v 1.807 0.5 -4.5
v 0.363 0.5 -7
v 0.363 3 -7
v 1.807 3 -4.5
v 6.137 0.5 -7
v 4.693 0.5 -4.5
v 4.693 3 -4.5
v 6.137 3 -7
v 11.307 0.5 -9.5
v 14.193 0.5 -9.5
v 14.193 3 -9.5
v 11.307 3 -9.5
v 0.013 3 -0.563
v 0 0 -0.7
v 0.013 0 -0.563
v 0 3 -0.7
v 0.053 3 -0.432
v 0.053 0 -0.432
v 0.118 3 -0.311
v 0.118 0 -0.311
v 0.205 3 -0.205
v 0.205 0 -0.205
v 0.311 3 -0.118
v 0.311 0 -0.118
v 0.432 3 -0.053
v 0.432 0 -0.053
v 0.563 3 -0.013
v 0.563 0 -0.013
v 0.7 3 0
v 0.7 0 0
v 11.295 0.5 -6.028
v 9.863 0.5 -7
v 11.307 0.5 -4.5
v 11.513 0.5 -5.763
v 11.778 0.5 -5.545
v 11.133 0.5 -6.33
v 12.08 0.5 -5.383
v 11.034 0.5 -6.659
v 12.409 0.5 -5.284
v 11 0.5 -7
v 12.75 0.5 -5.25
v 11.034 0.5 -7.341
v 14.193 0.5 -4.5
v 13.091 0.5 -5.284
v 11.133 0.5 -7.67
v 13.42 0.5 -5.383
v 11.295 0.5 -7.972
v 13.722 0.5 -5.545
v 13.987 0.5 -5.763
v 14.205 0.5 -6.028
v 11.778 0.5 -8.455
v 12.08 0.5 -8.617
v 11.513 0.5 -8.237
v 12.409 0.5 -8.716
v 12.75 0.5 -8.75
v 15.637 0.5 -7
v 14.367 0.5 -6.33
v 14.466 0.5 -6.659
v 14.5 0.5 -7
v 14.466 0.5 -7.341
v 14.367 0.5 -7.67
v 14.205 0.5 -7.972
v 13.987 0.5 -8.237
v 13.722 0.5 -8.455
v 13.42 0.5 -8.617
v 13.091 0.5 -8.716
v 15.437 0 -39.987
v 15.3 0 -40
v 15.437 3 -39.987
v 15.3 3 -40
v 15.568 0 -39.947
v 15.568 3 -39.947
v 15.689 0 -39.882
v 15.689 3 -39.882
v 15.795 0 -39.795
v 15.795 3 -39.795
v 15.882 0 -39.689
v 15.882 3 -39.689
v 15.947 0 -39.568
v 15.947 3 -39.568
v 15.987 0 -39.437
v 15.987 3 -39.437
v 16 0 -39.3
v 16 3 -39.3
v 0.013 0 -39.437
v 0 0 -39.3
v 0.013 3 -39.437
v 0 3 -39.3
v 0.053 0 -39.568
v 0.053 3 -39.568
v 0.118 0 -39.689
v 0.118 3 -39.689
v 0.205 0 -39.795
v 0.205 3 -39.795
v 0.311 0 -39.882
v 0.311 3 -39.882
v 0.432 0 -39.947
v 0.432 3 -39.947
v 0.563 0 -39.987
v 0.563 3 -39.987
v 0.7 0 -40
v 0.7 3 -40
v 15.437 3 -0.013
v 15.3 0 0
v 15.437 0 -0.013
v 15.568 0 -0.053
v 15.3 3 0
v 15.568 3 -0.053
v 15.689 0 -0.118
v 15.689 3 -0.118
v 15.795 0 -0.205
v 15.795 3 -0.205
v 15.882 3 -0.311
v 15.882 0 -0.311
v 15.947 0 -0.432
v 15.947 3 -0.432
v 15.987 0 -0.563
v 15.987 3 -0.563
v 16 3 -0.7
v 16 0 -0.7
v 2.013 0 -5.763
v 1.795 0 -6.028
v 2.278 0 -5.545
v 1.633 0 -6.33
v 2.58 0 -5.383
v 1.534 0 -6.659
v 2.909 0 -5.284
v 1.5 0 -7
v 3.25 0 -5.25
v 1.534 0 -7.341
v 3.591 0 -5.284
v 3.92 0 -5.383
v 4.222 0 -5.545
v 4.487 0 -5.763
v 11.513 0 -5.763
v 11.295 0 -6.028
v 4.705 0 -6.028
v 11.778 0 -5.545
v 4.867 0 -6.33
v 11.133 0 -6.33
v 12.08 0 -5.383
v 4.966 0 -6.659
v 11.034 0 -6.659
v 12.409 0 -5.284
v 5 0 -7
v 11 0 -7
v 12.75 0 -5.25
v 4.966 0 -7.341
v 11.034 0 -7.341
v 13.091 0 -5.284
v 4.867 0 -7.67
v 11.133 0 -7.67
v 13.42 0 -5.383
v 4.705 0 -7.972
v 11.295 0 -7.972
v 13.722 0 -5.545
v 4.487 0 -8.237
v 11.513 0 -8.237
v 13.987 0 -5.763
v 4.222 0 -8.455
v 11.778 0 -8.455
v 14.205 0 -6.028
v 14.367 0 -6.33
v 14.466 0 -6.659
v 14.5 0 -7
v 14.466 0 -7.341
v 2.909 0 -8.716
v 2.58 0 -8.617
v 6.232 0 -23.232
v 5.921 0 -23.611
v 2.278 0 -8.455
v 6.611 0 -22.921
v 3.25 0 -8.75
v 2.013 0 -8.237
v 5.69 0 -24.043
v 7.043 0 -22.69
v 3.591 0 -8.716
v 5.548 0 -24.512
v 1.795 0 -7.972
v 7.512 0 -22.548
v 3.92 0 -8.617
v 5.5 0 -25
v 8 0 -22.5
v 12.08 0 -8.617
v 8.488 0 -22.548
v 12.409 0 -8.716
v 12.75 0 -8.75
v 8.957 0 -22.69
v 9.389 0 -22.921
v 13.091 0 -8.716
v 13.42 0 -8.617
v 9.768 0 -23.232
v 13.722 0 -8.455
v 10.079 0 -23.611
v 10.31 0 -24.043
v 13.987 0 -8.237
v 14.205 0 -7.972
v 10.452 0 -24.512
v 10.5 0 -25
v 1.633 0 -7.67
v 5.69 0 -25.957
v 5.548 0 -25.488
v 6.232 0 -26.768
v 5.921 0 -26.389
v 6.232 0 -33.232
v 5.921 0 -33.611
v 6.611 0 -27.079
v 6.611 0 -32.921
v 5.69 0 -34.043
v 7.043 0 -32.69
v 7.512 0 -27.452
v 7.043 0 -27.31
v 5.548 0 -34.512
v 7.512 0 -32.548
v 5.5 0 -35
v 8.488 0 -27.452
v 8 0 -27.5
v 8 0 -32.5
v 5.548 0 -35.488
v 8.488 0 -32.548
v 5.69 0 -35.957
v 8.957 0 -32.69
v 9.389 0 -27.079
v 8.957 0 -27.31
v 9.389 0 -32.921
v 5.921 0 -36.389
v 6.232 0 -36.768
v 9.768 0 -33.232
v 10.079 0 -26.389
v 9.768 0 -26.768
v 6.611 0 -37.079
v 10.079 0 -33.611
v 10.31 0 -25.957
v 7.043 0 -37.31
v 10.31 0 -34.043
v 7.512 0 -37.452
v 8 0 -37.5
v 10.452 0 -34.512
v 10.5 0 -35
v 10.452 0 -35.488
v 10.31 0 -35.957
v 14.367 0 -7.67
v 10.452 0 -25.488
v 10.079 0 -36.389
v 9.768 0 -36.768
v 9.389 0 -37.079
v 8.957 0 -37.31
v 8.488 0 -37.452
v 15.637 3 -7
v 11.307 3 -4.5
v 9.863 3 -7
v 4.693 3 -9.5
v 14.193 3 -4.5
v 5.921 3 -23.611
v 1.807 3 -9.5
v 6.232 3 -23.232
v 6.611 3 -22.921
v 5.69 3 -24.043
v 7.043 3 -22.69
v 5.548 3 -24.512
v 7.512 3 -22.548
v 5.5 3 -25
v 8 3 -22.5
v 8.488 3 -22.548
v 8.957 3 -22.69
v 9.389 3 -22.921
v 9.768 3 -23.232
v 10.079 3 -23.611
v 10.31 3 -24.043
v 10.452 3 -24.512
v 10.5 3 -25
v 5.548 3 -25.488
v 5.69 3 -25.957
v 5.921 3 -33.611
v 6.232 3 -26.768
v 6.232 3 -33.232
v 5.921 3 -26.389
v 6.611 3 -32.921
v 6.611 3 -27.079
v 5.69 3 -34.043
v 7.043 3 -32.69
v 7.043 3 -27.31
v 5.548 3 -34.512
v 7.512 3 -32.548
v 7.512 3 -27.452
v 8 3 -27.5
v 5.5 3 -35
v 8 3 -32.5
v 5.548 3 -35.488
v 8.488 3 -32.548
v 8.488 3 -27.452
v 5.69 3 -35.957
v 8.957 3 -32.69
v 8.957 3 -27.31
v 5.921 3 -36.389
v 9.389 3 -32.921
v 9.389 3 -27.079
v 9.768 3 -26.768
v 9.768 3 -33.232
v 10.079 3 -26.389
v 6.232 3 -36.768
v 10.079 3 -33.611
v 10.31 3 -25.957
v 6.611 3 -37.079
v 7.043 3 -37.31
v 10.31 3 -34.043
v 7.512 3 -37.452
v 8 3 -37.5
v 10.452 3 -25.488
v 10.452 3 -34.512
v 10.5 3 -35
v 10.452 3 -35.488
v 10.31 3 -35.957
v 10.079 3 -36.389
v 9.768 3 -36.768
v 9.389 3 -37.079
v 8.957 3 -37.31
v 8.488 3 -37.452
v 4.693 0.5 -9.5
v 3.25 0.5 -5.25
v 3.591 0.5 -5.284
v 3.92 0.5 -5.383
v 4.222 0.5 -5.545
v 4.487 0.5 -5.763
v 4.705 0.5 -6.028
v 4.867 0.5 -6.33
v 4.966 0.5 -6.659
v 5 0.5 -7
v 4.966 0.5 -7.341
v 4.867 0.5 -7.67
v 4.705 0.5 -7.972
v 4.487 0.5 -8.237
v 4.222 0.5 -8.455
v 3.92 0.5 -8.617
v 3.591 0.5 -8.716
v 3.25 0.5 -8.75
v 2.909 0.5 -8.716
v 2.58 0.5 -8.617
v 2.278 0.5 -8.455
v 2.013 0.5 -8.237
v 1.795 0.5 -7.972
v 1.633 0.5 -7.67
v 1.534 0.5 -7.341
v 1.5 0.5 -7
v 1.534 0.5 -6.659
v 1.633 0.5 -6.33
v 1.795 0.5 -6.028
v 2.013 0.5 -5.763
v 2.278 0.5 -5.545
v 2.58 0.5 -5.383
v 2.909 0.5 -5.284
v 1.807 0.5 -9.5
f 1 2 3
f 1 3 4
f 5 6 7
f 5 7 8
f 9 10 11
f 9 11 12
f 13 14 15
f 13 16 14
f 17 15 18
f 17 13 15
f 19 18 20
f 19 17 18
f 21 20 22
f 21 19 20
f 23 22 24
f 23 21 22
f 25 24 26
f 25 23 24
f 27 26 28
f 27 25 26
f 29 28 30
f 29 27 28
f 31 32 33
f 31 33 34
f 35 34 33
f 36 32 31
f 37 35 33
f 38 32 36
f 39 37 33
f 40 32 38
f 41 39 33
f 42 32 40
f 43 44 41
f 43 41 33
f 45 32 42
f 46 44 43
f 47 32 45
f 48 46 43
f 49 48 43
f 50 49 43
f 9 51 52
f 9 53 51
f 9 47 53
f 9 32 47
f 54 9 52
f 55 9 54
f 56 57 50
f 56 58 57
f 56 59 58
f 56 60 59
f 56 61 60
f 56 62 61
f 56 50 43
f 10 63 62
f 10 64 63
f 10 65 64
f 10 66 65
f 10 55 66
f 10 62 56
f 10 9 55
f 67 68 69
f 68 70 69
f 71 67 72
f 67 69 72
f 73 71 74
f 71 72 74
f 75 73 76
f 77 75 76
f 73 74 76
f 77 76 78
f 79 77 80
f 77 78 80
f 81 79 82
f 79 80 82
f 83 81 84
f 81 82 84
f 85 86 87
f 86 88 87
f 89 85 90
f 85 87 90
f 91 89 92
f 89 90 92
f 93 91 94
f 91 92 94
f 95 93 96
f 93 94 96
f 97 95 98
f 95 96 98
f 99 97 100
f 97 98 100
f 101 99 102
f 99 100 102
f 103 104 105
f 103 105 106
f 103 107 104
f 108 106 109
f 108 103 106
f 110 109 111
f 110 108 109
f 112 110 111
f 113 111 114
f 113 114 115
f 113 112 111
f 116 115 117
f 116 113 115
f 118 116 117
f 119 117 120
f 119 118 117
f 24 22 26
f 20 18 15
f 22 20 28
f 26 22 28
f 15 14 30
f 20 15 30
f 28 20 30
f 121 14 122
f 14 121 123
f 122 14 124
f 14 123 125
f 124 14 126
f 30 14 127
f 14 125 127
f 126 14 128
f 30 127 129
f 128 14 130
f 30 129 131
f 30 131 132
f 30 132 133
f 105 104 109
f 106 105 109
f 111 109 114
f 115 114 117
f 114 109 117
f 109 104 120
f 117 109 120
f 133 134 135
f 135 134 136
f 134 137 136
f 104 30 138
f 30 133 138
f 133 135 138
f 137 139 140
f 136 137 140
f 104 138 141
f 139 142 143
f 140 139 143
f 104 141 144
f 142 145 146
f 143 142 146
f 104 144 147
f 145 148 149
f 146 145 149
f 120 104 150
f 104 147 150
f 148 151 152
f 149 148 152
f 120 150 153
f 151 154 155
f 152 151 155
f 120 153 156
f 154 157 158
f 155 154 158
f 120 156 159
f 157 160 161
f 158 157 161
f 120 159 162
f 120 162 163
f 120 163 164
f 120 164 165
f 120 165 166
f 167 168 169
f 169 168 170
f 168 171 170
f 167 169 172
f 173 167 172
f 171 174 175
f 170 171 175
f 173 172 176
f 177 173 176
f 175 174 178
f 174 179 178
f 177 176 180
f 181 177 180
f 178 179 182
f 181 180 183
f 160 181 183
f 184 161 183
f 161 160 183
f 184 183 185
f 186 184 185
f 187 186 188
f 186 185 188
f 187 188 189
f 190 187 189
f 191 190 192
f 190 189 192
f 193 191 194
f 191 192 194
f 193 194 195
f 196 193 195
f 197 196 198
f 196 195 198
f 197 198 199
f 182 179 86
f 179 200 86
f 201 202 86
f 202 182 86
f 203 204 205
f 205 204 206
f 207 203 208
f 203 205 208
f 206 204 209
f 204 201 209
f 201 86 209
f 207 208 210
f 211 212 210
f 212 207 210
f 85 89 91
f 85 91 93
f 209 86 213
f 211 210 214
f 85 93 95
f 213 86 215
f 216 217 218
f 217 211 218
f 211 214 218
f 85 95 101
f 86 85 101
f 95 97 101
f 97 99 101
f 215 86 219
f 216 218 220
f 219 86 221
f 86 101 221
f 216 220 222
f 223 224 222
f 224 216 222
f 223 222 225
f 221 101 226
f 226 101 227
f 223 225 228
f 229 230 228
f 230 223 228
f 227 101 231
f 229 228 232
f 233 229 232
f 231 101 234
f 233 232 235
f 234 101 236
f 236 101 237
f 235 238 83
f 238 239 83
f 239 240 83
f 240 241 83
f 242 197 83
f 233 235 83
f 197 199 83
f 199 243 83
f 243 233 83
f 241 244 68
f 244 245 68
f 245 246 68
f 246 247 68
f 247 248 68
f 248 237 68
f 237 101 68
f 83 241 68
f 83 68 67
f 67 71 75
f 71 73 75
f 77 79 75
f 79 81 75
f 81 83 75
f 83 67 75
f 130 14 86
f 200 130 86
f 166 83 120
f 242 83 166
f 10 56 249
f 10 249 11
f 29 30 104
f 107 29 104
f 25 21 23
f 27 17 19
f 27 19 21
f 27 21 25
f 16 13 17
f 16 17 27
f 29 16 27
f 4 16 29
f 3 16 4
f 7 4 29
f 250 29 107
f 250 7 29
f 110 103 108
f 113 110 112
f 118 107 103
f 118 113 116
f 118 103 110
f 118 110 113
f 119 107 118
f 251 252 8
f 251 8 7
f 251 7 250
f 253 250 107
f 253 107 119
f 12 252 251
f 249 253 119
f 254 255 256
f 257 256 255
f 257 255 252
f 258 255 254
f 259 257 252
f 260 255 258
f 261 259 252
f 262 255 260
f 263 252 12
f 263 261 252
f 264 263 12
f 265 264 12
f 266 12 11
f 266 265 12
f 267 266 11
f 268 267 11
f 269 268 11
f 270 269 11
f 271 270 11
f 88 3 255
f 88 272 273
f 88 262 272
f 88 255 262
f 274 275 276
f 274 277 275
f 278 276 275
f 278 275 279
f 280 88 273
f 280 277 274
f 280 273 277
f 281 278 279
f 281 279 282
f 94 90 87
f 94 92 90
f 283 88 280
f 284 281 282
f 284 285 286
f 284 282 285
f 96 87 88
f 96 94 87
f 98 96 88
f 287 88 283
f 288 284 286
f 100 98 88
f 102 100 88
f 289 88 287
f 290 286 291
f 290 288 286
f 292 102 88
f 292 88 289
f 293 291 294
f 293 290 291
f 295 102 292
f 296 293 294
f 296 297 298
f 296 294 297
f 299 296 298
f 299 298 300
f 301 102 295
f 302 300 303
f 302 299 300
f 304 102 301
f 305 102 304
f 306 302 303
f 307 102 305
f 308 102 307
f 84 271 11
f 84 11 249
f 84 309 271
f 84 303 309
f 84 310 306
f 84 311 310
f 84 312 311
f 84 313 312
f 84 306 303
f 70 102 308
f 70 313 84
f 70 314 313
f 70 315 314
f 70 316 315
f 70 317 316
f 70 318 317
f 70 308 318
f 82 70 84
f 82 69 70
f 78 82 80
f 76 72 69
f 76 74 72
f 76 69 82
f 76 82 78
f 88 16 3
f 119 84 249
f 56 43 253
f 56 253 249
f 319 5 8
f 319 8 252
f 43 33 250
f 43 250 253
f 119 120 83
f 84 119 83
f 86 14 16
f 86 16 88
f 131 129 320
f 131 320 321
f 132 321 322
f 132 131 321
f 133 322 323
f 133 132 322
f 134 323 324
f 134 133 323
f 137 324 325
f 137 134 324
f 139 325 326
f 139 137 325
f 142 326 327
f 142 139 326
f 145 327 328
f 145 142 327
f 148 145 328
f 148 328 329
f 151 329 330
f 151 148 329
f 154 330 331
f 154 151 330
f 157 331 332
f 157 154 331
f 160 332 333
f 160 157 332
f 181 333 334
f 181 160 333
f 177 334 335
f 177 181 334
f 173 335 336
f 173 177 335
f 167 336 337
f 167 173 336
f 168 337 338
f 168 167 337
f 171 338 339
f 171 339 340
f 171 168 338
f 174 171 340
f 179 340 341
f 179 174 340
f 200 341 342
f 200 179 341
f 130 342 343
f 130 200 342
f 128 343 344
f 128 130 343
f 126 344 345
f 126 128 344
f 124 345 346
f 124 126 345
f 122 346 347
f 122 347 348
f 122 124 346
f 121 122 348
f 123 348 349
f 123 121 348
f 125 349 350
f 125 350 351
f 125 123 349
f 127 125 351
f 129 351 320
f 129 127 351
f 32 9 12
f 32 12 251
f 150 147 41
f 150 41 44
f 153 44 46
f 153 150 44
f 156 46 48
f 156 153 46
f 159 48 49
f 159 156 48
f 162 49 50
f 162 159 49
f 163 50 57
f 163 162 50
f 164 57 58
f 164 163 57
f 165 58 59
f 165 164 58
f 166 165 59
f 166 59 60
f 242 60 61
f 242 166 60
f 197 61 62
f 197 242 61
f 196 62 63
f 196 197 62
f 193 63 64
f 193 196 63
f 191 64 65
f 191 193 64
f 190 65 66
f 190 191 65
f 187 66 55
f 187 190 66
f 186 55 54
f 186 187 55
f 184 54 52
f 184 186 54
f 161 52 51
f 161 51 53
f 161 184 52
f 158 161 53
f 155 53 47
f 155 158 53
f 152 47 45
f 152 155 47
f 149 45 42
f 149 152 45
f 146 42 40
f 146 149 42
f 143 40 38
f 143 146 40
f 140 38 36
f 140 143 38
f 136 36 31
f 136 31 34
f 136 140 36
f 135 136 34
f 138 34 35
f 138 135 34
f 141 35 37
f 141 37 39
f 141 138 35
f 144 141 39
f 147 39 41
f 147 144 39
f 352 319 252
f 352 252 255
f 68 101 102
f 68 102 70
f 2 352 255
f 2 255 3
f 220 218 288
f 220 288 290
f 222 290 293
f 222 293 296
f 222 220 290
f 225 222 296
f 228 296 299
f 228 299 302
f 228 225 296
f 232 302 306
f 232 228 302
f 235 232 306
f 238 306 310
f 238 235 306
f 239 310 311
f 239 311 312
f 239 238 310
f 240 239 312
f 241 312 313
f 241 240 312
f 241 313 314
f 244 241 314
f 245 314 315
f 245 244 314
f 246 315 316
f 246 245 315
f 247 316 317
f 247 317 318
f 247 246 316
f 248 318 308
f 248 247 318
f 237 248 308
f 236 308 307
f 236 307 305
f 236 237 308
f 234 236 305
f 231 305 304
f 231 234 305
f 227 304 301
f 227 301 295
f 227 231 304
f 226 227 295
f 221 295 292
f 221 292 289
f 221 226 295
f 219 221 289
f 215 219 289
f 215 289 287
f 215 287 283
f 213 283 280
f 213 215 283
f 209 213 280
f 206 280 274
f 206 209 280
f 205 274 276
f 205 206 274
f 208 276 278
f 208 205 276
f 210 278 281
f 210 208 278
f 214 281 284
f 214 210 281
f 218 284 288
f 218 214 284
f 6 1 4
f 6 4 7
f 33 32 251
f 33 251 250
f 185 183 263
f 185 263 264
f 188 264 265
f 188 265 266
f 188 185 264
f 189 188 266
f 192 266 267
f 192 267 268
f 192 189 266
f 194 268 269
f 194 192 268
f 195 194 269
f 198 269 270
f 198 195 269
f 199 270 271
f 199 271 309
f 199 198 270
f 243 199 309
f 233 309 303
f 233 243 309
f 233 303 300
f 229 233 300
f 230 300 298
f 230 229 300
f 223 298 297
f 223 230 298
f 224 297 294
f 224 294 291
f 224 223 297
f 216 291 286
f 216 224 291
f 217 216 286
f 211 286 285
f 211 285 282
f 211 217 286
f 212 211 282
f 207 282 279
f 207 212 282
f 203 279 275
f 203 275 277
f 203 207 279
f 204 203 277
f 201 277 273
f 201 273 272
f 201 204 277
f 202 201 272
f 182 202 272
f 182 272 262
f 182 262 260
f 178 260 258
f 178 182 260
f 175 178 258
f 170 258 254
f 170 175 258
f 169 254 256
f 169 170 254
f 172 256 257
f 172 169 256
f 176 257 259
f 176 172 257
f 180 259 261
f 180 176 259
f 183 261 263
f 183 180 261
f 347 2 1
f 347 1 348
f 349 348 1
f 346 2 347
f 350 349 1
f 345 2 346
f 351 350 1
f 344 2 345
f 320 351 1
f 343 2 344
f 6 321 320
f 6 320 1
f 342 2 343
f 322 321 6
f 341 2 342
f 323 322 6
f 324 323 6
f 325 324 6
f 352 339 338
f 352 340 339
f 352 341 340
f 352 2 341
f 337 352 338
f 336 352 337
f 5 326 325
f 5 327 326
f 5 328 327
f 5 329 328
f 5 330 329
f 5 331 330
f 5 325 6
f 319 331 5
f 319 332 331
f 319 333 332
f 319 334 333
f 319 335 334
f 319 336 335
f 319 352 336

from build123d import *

# Parameters (mm, degrees)
SKETCH1_W           = 16
SKETCH1_H           = 40
SKETCH1_R           = 2.5
BOSS_EXTRUDE1_DEPTH = 3
SKETCH1_3_R         = 1.75
BOSS_EXTRUDE2_DEPTH = 0.5
FILLET1_R           = 0.7


with BuildPart() as part:
    # Sketch1 → Boss-Extrude1 (new body)
    with BuildSketch(Plane(origin=(0, 0, 0), x_dir=(1, 0, 0), z_dir=(0, 1, 0))):
        with Locations((8, 20)):
            Rectangle(SKETCH1_W, SKETCH1_H)
        Polygon((1.806624327, 9.5), (4.693375673, 9.5), (6.136751346, 7), (4.693375673, 4.5), (1.806624327, 4.5), (0.363248654, 7), align=None, mode=Mode.SUBTRACT)
        Polygon((9.863248654, 7), (11.306624327, 9.5), (14.193375673, 9.5), (15.636751346, 7), (14.193375673, 4.5), (11.306624327, 4.5), align=None, mode=Mode.SUBTRACT)
        with Locations((8, 25)):
            Circle(SKETCH1_R, mode=Mode.SUBTRACT)
        with Locations((8, 35)):
            Circle(SKETCH1_R, mode=Mode.SUBTRACT)
    extrude(amount=BOSS_EXTRUDE1_DEPTH)

    # Sketch1<3> → Boss-Extrude2 (add)
    # profile 1 of 2: a face of its own
    with BuildSketch(Plane(origin=(0, 0, 0), x_dir=(1, 0, 0), z_dir=(0, 1, 0))):
        Polygon((6.136751346, 7), (4.693375673, 9.5), (1.806624327, 9.5), (0.363248654, 7), (1.806624327, 4.5), (4.693375673, 4.5), align=None)
        with Locations((3.25, 7)):
            Circle(SKETCH1_3_R, mode=Mode.SUBTRACT)
    # profile 2 of 2: a face of its own
    with BuildSketch(Plane(origin=(0, 0, 0), x_dir=(1, 0, 0), z_dir=(0, 1, 0))):
        Polygon((14.193375673, 9.5), (11.306624327, 9.5), (9.863248654, 7), (11.306624327, 4.5), (14.193375673, 4.5), (15.636751346, 7), align=None)
        with Locations((12.75, 7)):
            Circle(SKETCH1_3_R, mode=Mode.SUBTRACT)
    extrude(amount=BOSS_EXTRUDE2_DEPTH)

    # Fillet1
    fillet1_edges = [part.edges().sort_by_distance(p)[0] for p in [
        (0, 1.5, 0),
        (16, 1.5, 0),
        (16, 1.5, -40),
        (0, 1.5, -40),
    ]]
    fillet(fillet1_edges, radius=FILLET1_R)


solid = part.part
